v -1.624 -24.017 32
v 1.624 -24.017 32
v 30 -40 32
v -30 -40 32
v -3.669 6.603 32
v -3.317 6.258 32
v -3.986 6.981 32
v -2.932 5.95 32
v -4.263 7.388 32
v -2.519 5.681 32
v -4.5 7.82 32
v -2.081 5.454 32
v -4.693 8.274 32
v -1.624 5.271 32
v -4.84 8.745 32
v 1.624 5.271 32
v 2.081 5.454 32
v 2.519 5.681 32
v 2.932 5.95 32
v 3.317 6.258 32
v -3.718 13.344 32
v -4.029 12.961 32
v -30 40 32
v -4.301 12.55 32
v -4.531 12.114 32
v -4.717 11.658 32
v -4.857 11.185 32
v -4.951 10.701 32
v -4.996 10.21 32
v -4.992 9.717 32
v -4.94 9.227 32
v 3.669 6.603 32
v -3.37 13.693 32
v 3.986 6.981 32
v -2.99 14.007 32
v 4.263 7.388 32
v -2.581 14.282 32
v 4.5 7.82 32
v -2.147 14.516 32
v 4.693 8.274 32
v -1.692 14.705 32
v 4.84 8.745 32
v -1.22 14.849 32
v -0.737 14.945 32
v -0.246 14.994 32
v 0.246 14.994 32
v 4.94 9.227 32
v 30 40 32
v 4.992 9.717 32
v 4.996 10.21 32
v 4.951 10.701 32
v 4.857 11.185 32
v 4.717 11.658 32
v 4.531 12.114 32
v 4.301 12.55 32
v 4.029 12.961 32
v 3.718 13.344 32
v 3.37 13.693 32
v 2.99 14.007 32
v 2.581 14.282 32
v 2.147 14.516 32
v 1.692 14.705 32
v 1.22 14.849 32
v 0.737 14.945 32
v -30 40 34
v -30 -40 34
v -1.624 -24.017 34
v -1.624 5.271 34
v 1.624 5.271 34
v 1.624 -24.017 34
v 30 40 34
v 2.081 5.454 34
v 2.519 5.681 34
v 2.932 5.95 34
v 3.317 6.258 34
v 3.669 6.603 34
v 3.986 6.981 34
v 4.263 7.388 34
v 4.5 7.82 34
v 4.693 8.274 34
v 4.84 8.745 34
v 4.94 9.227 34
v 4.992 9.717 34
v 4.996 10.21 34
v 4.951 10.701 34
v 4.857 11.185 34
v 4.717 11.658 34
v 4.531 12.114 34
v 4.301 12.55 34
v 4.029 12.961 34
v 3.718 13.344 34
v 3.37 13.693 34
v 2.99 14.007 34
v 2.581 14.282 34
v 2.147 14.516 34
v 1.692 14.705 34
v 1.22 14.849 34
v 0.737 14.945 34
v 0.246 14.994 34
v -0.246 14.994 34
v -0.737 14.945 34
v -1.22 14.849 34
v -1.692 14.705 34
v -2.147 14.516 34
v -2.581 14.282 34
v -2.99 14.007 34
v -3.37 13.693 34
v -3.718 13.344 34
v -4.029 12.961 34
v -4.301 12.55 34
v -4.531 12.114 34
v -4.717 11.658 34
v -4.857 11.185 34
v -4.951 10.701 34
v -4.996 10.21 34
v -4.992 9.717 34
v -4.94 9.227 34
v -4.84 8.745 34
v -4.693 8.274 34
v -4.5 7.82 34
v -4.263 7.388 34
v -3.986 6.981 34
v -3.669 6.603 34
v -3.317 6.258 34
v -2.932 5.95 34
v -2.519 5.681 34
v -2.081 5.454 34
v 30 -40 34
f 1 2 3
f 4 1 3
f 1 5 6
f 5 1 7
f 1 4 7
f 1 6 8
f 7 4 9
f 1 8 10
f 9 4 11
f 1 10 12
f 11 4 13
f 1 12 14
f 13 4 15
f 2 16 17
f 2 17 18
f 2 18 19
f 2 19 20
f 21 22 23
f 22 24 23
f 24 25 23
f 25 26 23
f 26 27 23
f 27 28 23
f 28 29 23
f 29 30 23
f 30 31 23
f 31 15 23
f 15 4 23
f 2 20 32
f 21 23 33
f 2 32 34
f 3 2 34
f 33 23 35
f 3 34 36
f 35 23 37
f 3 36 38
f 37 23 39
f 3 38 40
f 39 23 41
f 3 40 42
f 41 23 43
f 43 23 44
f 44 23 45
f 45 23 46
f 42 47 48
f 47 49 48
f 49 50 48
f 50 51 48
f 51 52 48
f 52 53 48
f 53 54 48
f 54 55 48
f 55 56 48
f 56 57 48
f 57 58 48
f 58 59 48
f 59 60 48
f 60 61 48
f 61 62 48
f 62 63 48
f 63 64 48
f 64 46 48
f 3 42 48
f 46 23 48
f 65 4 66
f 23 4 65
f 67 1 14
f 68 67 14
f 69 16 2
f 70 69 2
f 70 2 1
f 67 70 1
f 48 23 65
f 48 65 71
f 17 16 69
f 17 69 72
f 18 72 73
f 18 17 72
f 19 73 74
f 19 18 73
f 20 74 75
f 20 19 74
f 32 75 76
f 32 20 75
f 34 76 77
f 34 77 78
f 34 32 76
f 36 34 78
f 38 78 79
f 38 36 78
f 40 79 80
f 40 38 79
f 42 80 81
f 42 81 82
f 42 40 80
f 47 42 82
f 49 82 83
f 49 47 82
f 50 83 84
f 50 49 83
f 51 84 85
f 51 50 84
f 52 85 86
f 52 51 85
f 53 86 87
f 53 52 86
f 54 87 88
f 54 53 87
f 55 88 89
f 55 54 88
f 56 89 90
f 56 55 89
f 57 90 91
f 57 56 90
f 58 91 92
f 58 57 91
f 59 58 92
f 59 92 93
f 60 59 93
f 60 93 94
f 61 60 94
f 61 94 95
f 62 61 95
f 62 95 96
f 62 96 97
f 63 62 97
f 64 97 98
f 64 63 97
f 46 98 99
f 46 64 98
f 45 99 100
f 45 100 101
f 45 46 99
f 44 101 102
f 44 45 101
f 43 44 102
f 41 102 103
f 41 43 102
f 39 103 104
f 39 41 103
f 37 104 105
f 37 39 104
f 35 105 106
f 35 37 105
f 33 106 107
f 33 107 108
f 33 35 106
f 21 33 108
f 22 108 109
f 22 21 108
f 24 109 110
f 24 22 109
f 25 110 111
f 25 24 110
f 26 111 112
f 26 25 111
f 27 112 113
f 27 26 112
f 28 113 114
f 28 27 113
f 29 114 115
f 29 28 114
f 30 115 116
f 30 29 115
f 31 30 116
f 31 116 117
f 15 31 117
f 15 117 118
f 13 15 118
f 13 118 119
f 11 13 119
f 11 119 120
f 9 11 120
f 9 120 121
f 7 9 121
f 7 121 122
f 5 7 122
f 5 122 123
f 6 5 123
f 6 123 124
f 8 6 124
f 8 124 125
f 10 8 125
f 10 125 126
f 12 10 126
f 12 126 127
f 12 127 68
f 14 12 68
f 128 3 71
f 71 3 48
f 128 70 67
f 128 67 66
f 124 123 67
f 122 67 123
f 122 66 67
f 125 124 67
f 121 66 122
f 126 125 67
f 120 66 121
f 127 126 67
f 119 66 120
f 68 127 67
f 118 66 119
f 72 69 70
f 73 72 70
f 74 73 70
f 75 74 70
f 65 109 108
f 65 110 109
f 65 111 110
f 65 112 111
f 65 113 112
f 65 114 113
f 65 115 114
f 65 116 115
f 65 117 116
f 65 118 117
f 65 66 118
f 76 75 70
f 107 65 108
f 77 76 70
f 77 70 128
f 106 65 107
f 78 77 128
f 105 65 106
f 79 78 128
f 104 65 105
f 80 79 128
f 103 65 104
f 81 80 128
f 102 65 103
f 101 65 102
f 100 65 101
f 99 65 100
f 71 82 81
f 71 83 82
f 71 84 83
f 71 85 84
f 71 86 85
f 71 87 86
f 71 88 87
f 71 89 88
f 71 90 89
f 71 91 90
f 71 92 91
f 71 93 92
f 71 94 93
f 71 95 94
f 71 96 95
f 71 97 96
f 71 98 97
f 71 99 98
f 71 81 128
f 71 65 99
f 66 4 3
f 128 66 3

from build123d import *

# Parameters (mm, degrees)
SKETCH_W  = 60
SKETCH_H  = 80
PAD_DEPTH = 2


with BuildPart() as part:
    # Sketch → Pad (new body)
    with BuildSketch(Plane.XY.offset(32)):
        Rectangle(SKETCH_W, SKETCH_H)
        with BuildLine():
            ThreePointArc((1.623618, 5.270955), (0, 15), (-1.623618, 5.270955))
            Line((-1.623618, -24.016518), (-1.623618, 5.270955))
            Line((1.623618, -24.016518), (-1.623618, -24.016518))
            Line((1.623618, 5.270955), (1.623618, -24.016518))
        make_face(mode=Mode.SUBTRACT)
    extrude(amount=PAD_DEPTH)


solid = part.part
